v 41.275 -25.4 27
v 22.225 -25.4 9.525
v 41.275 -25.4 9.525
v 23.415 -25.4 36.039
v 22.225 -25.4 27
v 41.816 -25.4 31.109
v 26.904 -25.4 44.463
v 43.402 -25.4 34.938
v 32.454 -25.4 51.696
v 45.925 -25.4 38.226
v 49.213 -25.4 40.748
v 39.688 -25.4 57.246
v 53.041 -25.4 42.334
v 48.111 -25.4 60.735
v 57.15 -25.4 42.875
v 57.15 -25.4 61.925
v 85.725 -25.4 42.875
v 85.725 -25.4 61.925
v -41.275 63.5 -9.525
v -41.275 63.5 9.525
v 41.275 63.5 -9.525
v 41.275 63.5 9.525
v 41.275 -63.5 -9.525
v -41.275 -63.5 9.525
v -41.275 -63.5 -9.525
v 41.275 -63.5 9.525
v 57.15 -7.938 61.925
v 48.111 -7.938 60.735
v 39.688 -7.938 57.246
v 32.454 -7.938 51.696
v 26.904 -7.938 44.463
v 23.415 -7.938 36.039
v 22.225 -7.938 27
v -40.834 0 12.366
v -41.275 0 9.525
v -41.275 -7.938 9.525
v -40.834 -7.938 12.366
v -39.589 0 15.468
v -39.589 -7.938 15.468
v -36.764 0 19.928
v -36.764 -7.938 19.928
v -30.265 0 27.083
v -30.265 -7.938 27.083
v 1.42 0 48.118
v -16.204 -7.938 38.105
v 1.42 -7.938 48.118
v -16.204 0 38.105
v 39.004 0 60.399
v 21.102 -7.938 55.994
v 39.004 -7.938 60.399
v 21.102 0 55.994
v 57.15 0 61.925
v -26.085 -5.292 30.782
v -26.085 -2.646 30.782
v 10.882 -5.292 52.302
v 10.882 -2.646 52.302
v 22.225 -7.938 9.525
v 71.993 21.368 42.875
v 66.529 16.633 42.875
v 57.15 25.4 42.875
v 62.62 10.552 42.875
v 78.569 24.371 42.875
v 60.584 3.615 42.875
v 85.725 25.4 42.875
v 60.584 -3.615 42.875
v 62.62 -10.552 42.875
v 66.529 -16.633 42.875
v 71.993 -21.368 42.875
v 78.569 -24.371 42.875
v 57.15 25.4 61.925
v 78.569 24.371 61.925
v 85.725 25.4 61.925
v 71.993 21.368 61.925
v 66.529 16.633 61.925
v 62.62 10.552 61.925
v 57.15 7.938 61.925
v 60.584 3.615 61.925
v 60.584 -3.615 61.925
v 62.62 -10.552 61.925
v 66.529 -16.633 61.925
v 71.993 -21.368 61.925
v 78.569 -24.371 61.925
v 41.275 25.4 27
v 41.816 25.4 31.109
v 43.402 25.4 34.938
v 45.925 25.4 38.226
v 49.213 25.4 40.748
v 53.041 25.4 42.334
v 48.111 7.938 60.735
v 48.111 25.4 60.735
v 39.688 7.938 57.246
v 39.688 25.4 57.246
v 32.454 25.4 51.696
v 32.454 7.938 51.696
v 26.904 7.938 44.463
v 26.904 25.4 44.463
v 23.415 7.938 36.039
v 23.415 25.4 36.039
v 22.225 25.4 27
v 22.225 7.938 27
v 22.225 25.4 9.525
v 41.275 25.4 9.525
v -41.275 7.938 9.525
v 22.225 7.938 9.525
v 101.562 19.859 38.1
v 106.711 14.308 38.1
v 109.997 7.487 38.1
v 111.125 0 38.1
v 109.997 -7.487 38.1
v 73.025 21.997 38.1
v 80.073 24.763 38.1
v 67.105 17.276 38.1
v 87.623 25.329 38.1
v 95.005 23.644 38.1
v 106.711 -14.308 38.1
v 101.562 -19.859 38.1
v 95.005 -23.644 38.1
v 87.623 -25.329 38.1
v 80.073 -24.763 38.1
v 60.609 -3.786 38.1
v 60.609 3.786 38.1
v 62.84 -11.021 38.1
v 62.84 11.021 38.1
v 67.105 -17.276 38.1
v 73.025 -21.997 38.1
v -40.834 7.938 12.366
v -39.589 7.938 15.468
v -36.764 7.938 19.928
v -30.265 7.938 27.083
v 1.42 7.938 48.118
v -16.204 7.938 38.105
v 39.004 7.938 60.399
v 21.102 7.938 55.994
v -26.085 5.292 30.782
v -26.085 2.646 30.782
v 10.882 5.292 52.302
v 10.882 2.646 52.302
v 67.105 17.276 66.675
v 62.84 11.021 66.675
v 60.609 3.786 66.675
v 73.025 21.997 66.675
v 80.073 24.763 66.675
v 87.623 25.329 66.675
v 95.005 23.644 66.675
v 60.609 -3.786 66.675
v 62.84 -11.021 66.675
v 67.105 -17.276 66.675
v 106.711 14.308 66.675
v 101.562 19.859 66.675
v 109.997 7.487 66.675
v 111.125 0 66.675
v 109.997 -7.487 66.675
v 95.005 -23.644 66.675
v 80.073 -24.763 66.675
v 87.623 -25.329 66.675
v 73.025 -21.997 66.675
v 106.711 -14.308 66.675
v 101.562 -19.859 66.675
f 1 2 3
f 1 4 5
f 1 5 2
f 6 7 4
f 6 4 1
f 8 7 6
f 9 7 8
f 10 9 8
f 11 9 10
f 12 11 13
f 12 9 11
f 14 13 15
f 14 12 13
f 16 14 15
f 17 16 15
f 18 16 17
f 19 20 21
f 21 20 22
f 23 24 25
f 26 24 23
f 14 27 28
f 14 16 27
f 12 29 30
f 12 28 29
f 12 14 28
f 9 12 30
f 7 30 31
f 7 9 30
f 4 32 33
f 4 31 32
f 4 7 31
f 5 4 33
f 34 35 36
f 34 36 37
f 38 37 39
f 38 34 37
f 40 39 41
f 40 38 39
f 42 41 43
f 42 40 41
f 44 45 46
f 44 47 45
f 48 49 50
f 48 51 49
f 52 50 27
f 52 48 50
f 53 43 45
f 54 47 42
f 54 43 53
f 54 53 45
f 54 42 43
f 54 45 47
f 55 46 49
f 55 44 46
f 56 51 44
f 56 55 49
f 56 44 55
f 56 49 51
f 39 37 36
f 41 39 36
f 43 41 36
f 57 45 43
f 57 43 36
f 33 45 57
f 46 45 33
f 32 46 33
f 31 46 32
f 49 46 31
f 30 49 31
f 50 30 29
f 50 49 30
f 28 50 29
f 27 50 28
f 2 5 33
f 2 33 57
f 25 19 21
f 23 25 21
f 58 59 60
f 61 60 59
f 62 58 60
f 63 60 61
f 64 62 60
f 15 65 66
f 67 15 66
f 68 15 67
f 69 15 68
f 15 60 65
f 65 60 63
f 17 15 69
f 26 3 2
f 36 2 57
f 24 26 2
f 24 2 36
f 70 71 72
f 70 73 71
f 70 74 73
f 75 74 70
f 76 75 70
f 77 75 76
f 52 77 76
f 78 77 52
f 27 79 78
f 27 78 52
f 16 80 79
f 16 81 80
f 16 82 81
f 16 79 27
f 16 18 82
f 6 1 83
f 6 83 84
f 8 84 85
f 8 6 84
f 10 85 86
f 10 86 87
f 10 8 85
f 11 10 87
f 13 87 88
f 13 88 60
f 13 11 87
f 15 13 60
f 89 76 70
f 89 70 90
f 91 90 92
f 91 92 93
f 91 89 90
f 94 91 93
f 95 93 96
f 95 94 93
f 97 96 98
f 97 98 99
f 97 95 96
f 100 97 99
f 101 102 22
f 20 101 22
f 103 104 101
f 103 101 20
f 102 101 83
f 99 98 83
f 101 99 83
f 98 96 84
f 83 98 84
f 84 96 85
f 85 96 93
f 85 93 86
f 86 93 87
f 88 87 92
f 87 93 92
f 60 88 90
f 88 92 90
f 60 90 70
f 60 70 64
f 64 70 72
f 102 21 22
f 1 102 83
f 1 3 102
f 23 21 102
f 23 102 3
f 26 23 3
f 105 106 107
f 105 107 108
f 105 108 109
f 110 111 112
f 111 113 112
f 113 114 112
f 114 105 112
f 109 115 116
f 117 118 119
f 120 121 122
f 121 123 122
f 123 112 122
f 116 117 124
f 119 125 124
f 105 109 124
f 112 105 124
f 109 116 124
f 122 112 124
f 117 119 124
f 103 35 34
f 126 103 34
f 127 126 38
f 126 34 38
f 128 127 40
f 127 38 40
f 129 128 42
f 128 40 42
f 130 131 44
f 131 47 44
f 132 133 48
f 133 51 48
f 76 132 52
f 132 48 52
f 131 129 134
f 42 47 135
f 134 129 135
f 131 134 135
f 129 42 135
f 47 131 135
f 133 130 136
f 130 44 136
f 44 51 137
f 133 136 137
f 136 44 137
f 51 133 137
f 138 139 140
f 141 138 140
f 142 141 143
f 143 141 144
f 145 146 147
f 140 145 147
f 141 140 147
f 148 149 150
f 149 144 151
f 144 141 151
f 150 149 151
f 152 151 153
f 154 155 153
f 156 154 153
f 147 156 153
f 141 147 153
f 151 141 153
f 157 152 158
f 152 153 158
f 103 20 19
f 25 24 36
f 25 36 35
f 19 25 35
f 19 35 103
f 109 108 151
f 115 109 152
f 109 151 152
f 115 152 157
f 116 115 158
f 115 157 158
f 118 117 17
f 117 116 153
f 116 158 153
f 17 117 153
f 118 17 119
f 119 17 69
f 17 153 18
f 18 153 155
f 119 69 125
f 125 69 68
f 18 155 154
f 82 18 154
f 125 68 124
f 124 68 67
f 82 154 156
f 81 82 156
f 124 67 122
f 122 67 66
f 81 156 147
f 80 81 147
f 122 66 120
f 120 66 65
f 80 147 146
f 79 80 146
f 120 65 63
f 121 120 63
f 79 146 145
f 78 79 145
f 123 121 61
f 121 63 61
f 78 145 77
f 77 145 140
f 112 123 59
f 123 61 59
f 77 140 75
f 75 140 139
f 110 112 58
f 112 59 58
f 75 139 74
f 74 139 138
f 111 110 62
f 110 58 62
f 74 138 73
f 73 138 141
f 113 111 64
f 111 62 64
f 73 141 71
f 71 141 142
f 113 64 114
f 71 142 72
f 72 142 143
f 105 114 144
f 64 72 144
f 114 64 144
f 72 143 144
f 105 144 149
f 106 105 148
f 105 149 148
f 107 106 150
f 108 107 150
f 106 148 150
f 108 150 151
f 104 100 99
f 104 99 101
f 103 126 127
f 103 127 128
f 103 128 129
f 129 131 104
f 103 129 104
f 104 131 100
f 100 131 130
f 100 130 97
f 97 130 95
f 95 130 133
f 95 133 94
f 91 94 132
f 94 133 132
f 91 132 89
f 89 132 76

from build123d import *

# Parameters (mm, degrees)
F1_DEPTH = 63.5
F0_W     = 25.4
F0_H     = 19.05
F2_DEPTH = 25.4
F3_DEPTH = 7.9375


with BuildPart() as f1:
    # F0 (on Front) → F1 (new body, symmetric)
    with BuildSketch(Plane.XZ):
        Polygon((41.275, -9.525), (41.275, 9.525), (22.225, 9.525), (-41.275, 9.525), (-41.275, -9.525), align=None)
    extrude(amount=F1_DEPTH, both=True)

    # F0 (on Front) → F2 (join, symmetric)
    with BuildSketch(Plane.XZ):
        with BuildLine():
            Line((22.225, 9.525), (41.275, 9.525))
            Line((41.275, 9.525), (41.275, 27.0002))
            ThreePointArc((41.275, 27.0002), (45.9246798487, 38.2255201513), (57.15, 42.8752))
            Line((57.15, 42.8752), (60.325, 42.8752))
            Line((60.325, 42.8752), (60.325, 61.9252))
            Line((60.325, 61.9252), (57.15, 61.9252))
            ThreePointArc((57.15, 61.9252), (32.4542956671, 51.6959043329), (22.225, 27.0002))
            Line((22.225, 27.0002), (22.225, 9.525))
        make_face()
        with Locations((73.025, 52.4002)):
            Rectangle(F0_W, F0_H)
    extrude(amount=F2_DEPTH, both=True)

    # F0 (on Front) → F3 (join, symmetric)
    with BuildSketch(Plane.XZ):
        with BuildLine():
            Line((-41.275, 9.525), (22.225, 9.525))
            Line((22.225, 9.525), (22.225, 27.0002))
            ThreePointArc((22.225, 27.0002), (32.4542956671, 51.6959043329), (57.15, 61.9252))
            add(Edge.make_bspline(
                [(-41.275, 9.525), (-41.1306880414, 26.5983454883), (10.3886332363, 62.302429229), (57.15, 61.9252)],
                knots=[0, 0, 0, 0, 111.5045361635, 111.5045361635, 111.5045361635, 111.5045361635], degree=3))
        make_face()
    extrude(amount=F3_DEPTH, both=True)

    # F0 (on Front) → F4 (revolve)
    with BuildSketch(Plane.XZ):
        Polygon((85.725, 61.9252), (85.725, 42.8752), (85.725, 38.1), (111.125, 38.1), (111.125, 66.675), (85.725, 66.675), align=None)
    revolve(axis=Axis((85.725, 0, 52.3875), (0, 0, -1)))


solid = f1.part
